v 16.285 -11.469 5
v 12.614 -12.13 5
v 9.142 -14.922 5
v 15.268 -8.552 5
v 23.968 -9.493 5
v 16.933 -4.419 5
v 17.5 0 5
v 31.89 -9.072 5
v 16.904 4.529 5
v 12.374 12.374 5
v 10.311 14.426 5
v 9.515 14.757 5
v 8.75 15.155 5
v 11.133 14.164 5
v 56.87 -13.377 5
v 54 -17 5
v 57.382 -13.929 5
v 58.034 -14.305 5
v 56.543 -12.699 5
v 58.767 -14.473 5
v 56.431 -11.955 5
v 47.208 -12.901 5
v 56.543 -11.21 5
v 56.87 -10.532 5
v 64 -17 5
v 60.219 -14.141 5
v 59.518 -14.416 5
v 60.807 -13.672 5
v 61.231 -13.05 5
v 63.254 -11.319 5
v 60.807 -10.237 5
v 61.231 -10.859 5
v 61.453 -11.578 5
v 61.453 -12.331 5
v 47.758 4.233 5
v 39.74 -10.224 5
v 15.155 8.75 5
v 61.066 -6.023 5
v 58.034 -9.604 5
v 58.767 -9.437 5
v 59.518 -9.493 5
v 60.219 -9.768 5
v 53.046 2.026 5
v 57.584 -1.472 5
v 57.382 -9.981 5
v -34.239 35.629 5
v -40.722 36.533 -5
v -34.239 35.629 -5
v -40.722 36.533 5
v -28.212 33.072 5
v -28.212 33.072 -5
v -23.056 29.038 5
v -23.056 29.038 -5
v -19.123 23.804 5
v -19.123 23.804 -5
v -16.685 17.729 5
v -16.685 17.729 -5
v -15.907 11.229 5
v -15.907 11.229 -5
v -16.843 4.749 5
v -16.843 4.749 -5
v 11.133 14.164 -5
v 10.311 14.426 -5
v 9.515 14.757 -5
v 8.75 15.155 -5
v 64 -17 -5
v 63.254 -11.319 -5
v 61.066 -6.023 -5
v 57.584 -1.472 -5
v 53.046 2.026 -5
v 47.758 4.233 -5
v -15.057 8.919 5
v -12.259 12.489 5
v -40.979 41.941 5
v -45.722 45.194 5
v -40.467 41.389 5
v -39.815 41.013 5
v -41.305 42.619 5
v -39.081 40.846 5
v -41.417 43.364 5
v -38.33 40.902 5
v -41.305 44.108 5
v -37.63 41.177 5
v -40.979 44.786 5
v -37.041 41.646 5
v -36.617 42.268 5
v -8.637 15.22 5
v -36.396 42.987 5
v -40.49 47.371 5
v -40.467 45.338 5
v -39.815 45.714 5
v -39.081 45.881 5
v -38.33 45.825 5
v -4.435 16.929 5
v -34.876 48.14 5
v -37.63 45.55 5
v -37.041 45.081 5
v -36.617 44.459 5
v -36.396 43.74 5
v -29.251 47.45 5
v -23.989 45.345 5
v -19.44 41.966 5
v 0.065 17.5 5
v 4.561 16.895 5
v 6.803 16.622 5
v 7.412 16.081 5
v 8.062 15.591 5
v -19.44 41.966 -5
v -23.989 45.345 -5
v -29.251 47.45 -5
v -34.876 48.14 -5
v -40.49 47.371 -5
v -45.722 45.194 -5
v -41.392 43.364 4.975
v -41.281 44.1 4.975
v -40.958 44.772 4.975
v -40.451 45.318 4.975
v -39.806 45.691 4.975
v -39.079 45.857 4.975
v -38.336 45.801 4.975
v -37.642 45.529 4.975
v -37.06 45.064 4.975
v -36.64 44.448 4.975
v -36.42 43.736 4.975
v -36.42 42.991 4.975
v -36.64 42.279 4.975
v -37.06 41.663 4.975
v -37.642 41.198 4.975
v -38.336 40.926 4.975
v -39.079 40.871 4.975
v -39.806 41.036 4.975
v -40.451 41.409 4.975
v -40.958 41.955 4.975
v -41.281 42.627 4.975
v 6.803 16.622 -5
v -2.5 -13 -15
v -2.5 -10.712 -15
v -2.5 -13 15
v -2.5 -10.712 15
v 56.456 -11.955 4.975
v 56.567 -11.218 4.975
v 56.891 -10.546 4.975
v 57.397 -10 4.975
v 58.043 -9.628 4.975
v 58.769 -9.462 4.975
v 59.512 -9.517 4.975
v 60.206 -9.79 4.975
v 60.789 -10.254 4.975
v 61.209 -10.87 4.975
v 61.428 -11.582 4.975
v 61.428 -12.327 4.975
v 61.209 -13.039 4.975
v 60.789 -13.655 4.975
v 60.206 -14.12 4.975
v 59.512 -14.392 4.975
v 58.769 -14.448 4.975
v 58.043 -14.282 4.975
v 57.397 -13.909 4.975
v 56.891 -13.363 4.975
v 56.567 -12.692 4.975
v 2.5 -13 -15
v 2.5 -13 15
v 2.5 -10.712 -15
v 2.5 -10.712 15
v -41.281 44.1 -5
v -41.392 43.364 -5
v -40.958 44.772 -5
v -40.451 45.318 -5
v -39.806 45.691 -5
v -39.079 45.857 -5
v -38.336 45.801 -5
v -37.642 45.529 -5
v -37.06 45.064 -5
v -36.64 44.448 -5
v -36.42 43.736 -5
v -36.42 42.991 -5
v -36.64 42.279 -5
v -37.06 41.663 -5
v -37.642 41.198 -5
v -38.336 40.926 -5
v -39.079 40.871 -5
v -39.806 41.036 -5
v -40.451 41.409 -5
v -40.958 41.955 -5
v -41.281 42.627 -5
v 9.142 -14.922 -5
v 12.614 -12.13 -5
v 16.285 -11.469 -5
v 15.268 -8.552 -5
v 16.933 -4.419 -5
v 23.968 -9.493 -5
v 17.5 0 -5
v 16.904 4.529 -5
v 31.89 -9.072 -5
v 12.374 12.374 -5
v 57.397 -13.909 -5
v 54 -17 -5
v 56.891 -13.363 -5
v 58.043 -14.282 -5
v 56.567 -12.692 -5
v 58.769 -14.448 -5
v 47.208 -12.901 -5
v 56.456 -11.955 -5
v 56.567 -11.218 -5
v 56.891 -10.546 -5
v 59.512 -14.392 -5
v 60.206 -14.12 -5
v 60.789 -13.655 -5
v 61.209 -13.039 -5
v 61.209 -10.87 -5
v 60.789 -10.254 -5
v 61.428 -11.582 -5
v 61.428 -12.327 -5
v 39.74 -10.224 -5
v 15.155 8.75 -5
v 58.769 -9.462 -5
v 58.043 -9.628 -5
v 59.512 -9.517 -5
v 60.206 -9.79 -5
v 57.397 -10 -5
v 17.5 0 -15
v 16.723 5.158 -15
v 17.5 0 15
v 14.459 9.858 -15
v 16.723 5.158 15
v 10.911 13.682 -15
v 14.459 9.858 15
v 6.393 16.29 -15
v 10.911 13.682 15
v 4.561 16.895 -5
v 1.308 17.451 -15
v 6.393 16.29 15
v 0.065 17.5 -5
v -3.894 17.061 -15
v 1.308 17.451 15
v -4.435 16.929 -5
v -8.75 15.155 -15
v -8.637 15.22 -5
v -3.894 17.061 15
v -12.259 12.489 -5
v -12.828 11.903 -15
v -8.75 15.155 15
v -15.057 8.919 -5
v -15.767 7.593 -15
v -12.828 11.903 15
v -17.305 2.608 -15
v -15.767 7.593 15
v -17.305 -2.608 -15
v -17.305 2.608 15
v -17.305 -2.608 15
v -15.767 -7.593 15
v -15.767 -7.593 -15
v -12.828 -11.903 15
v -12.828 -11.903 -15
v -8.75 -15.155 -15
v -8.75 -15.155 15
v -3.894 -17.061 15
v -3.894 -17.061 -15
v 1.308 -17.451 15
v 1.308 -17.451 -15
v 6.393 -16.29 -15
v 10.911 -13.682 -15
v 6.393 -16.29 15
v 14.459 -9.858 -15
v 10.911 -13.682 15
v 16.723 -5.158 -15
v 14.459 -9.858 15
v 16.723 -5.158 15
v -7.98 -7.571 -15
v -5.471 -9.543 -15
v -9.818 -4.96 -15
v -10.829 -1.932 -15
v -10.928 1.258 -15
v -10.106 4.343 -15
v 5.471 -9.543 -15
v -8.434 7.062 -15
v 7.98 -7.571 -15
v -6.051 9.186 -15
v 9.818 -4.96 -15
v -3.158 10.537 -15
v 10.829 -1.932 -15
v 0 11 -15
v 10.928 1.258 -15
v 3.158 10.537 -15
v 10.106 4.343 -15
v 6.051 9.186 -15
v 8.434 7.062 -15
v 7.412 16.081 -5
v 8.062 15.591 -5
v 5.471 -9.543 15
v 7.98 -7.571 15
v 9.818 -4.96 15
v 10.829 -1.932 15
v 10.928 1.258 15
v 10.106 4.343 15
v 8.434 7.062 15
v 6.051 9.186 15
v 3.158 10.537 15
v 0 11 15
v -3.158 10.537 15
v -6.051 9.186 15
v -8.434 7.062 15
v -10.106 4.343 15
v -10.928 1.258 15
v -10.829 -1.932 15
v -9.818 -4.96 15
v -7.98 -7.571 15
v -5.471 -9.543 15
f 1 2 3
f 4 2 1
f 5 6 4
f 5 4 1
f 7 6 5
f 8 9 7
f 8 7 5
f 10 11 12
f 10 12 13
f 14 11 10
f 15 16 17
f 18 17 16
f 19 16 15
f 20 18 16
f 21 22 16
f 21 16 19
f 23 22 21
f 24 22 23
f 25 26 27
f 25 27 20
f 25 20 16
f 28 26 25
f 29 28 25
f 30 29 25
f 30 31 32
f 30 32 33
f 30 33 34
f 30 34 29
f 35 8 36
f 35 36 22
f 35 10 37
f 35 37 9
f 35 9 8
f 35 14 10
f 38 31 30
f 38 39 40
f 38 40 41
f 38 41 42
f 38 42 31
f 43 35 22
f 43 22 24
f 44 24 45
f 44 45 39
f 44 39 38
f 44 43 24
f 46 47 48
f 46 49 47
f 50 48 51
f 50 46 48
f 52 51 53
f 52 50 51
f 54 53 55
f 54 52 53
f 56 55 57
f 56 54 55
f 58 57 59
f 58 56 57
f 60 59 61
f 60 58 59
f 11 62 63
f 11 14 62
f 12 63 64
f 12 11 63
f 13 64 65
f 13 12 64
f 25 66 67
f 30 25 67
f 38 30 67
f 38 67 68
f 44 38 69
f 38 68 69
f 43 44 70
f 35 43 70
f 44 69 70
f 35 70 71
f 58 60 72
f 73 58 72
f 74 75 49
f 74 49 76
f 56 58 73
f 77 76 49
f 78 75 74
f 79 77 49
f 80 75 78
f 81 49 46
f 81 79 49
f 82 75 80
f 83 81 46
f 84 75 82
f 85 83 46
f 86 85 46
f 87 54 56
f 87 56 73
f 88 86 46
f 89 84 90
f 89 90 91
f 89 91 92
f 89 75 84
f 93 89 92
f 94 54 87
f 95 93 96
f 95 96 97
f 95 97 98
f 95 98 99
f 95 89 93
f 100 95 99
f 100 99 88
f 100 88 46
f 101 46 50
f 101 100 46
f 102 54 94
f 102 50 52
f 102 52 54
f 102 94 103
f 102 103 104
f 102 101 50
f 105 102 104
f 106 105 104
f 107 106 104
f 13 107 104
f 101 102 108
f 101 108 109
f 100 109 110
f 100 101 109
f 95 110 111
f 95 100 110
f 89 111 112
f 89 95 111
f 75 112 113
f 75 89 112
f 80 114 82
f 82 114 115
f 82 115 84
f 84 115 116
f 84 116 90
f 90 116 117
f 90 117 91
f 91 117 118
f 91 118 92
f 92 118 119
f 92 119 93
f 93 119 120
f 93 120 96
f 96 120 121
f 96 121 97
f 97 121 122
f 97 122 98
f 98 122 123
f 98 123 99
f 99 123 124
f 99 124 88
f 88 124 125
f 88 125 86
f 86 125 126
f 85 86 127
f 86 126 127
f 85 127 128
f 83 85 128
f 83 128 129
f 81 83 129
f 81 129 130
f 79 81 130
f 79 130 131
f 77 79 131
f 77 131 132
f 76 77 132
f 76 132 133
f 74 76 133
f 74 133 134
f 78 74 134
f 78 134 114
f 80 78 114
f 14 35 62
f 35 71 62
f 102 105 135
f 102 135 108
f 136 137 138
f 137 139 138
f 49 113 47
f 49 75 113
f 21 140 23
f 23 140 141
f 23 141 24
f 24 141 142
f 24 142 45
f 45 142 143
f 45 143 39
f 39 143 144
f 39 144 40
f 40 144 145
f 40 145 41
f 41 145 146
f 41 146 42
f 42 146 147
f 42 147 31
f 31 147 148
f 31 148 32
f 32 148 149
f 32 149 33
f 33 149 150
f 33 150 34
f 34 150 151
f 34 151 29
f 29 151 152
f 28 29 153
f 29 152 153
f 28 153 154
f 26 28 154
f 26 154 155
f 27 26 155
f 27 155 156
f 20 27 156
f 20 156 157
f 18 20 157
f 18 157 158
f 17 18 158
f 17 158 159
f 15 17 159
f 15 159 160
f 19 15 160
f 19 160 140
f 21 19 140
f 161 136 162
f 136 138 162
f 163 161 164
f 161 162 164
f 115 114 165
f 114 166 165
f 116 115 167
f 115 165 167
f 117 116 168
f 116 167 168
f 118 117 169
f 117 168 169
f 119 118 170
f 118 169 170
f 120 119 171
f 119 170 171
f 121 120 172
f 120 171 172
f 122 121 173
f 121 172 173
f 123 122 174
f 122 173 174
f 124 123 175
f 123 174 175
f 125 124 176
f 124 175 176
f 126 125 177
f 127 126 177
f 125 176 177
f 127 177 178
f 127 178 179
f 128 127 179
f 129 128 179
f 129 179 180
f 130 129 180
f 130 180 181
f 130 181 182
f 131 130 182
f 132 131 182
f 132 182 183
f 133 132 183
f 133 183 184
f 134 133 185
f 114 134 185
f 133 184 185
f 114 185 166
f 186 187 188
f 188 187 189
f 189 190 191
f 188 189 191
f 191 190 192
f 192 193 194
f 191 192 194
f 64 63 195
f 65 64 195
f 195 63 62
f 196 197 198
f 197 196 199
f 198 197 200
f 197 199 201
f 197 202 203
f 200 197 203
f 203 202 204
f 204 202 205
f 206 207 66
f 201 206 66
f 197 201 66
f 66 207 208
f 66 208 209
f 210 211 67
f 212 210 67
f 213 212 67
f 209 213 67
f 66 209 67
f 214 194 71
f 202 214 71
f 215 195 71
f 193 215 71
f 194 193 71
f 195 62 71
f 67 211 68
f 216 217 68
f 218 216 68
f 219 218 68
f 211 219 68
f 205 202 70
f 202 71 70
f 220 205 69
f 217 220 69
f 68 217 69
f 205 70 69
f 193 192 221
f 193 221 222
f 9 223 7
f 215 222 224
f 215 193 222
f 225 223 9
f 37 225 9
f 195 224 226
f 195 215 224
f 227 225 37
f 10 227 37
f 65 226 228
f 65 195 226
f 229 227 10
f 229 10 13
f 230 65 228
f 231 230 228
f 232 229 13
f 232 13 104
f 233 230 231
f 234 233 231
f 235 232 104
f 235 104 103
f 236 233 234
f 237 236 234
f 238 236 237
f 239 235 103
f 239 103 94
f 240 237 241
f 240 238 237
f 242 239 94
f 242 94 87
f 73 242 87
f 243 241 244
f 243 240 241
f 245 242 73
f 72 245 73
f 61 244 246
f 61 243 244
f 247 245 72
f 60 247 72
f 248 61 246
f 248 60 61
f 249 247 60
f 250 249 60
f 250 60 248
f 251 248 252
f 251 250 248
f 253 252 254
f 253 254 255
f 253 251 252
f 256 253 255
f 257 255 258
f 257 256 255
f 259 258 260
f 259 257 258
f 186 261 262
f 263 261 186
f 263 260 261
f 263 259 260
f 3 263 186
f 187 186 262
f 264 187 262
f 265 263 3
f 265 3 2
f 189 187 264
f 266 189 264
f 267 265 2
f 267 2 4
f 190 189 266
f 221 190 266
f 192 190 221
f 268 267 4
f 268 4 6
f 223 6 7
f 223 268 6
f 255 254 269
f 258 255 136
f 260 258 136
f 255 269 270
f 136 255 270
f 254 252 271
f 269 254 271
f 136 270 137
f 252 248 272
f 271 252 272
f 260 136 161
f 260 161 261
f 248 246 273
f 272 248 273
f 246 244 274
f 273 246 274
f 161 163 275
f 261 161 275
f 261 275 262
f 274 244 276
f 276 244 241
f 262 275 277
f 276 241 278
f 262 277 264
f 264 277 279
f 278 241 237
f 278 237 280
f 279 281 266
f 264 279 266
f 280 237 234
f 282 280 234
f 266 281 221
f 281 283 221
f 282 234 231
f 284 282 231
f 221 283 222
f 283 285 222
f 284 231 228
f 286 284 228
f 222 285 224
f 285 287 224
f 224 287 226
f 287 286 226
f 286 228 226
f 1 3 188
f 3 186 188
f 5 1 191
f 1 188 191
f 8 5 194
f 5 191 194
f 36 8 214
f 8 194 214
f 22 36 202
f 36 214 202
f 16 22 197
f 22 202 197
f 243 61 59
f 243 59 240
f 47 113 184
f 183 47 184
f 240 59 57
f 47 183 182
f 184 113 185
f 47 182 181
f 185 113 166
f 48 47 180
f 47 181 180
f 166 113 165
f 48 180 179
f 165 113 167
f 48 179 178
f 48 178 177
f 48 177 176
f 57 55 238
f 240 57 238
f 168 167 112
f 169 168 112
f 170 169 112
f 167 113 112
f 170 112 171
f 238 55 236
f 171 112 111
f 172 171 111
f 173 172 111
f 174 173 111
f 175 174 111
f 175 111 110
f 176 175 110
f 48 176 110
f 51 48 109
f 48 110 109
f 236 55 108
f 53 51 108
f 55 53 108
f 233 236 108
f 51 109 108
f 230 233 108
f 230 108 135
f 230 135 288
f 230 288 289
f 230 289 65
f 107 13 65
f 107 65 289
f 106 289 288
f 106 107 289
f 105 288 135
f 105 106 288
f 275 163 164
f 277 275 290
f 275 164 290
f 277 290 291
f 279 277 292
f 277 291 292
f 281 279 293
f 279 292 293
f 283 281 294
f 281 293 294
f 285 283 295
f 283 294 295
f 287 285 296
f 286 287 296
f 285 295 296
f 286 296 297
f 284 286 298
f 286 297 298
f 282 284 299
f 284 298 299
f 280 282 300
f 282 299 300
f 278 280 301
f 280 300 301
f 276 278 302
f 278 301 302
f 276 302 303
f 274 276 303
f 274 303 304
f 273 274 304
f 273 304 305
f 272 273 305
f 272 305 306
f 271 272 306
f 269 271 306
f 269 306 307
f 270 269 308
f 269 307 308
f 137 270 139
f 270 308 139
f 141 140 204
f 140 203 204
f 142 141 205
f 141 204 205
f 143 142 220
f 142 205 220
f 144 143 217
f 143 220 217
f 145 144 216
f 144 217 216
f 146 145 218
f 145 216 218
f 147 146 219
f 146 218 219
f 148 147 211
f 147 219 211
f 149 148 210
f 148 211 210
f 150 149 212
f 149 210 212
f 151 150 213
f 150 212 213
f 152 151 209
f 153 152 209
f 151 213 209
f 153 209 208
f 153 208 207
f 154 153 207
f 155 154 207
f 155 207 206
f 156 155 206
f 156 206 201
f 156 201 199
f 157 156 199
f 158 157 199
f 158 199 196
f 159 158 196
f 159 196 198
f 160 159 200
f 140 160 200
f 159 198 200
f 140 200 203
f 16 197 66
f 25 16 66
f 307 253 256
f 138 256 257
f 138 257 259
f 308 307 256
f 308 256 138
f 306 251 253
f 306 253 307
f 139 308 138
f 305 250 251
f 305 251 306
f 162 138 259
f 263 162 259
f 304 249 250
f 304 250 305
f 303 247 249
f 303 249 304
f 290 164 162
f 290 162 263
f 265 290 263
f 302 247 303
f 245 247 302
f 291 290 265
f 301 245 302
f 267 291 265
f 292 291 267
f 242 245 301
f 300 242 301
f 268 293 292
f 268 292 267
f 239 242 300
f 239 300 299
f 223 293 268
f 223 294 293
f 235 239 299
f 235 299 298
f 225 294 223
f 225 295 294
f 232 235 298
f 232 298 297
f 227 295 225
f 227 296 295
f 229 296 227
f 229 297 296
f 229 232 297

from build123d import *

# Parameters (mm, degrees)
SCHIZZO2_R                   = 17.5
ESTRUSIONE_ESTRUSIONE2_DEPTH = 15
ESTRUSIONE_ESTRUSIONE3_DEPTH = 5
FORO_5_0_5_1_D               = 5
FORO_5_0_5_1_CSINK_D         = 5.05
FORO_5_0_5_1_CSINK_ANGLE     = 90


with BuildPart() as part:
    # Schizzo2 → Estrusione-Estrusione2 (new, symmetric)
    with BuildSketch(Plane.XY):
        Circle(SCHIZZO2_R)
        with BuildLine():
            ThreePointArc((2.5, -10.712142643), (0, 11), (-2.5, -10.712142643))
            Line((-2.5, -10.712142643), (-2.5, -13))
            Line((-2.5, -13), (2.5, -13))
            Line((2.5, -13), (2.5, -10.712142643))
        make_face(mode=Mode.SUBTRACT)
    extrude(amount=ESTRUSIONE_ESTRUSIONE2_DEPTH, both=True)

    # Schizzo2<8> → Estrusione-Estrusione3 (add, symmetric)
    with BuildSketch(Plane.XY):
        with BuildLine():
            Line((-45.722431864, 45.193575035), (-40.722431864, 36.533320997))
            ThreePointArc((-40.722431864, 36.533320997), (-20.917414575, 26.550556749), (-16.843225773, 4.749288954))
            ThreePointArc((-16.843225773, 4.749288954), (-6.591440531, 16.211197109), (8.750000884, 15.155444056))
            ThreePointArc((8.750000884, 15.155444056), (7.731750254, 15.829418494), (6.803236294, 16.62247443))
            Line((6.803236294, 16.62247443), (-19.439551712, 41.966109335))
            ThreePointArc((-19.439551712, 41.966109335), (-32.041033104, 47.97699794), (-45.722431864, 45.193575035))
        make_face()
        with BuildLine():
            ThreePointArc((17.5, 0), (15.268302341, -8.551546271), (9.142406443, -14.922010737))
            ThreePointArc((9.142406443, -14.922010737), (31.890315924, -9.07231341), (54, -17))
            Line((54, -17), (64, -17))
            ThreePointArc((64, -17), (59.47377273, -3.633352456), (47.757521221, 4.233251032))
            Line((47.757521221, 4.233251032), (11.132944899, 14.164220862))
            ThreePointArc((11.132944899, 14.164220862), (9.909360784, 14.582633544), (8.750000884, 15.155444056))
            ThreePointArc((8.750000884, 15.155444056), (15.155444821, 8.749999558), (17.5, 0))
        make_face()
    extrude(amount=ESTRUSIONE_ESTRUSIONE3_DEPTH, both=True)

    # Foro Ø5.0 (5)-1 (through all)
    with Locations(Plane(origin=(-38.892335599, 43.363541782, 5), x_dir=(1, 0, 0), z_dir=(0, 0, 1))):
        with Locations((0, 0), (97.848441208, -55.318294404)):
            CounterSinkHole(FORO_5_0_5_1_D / 2, FORO_5_0_5_1_CSINK_D / 2, counter_sink_angle=FORO_5_0_5_1_CSINK_ANGLE)


solid = part.part
